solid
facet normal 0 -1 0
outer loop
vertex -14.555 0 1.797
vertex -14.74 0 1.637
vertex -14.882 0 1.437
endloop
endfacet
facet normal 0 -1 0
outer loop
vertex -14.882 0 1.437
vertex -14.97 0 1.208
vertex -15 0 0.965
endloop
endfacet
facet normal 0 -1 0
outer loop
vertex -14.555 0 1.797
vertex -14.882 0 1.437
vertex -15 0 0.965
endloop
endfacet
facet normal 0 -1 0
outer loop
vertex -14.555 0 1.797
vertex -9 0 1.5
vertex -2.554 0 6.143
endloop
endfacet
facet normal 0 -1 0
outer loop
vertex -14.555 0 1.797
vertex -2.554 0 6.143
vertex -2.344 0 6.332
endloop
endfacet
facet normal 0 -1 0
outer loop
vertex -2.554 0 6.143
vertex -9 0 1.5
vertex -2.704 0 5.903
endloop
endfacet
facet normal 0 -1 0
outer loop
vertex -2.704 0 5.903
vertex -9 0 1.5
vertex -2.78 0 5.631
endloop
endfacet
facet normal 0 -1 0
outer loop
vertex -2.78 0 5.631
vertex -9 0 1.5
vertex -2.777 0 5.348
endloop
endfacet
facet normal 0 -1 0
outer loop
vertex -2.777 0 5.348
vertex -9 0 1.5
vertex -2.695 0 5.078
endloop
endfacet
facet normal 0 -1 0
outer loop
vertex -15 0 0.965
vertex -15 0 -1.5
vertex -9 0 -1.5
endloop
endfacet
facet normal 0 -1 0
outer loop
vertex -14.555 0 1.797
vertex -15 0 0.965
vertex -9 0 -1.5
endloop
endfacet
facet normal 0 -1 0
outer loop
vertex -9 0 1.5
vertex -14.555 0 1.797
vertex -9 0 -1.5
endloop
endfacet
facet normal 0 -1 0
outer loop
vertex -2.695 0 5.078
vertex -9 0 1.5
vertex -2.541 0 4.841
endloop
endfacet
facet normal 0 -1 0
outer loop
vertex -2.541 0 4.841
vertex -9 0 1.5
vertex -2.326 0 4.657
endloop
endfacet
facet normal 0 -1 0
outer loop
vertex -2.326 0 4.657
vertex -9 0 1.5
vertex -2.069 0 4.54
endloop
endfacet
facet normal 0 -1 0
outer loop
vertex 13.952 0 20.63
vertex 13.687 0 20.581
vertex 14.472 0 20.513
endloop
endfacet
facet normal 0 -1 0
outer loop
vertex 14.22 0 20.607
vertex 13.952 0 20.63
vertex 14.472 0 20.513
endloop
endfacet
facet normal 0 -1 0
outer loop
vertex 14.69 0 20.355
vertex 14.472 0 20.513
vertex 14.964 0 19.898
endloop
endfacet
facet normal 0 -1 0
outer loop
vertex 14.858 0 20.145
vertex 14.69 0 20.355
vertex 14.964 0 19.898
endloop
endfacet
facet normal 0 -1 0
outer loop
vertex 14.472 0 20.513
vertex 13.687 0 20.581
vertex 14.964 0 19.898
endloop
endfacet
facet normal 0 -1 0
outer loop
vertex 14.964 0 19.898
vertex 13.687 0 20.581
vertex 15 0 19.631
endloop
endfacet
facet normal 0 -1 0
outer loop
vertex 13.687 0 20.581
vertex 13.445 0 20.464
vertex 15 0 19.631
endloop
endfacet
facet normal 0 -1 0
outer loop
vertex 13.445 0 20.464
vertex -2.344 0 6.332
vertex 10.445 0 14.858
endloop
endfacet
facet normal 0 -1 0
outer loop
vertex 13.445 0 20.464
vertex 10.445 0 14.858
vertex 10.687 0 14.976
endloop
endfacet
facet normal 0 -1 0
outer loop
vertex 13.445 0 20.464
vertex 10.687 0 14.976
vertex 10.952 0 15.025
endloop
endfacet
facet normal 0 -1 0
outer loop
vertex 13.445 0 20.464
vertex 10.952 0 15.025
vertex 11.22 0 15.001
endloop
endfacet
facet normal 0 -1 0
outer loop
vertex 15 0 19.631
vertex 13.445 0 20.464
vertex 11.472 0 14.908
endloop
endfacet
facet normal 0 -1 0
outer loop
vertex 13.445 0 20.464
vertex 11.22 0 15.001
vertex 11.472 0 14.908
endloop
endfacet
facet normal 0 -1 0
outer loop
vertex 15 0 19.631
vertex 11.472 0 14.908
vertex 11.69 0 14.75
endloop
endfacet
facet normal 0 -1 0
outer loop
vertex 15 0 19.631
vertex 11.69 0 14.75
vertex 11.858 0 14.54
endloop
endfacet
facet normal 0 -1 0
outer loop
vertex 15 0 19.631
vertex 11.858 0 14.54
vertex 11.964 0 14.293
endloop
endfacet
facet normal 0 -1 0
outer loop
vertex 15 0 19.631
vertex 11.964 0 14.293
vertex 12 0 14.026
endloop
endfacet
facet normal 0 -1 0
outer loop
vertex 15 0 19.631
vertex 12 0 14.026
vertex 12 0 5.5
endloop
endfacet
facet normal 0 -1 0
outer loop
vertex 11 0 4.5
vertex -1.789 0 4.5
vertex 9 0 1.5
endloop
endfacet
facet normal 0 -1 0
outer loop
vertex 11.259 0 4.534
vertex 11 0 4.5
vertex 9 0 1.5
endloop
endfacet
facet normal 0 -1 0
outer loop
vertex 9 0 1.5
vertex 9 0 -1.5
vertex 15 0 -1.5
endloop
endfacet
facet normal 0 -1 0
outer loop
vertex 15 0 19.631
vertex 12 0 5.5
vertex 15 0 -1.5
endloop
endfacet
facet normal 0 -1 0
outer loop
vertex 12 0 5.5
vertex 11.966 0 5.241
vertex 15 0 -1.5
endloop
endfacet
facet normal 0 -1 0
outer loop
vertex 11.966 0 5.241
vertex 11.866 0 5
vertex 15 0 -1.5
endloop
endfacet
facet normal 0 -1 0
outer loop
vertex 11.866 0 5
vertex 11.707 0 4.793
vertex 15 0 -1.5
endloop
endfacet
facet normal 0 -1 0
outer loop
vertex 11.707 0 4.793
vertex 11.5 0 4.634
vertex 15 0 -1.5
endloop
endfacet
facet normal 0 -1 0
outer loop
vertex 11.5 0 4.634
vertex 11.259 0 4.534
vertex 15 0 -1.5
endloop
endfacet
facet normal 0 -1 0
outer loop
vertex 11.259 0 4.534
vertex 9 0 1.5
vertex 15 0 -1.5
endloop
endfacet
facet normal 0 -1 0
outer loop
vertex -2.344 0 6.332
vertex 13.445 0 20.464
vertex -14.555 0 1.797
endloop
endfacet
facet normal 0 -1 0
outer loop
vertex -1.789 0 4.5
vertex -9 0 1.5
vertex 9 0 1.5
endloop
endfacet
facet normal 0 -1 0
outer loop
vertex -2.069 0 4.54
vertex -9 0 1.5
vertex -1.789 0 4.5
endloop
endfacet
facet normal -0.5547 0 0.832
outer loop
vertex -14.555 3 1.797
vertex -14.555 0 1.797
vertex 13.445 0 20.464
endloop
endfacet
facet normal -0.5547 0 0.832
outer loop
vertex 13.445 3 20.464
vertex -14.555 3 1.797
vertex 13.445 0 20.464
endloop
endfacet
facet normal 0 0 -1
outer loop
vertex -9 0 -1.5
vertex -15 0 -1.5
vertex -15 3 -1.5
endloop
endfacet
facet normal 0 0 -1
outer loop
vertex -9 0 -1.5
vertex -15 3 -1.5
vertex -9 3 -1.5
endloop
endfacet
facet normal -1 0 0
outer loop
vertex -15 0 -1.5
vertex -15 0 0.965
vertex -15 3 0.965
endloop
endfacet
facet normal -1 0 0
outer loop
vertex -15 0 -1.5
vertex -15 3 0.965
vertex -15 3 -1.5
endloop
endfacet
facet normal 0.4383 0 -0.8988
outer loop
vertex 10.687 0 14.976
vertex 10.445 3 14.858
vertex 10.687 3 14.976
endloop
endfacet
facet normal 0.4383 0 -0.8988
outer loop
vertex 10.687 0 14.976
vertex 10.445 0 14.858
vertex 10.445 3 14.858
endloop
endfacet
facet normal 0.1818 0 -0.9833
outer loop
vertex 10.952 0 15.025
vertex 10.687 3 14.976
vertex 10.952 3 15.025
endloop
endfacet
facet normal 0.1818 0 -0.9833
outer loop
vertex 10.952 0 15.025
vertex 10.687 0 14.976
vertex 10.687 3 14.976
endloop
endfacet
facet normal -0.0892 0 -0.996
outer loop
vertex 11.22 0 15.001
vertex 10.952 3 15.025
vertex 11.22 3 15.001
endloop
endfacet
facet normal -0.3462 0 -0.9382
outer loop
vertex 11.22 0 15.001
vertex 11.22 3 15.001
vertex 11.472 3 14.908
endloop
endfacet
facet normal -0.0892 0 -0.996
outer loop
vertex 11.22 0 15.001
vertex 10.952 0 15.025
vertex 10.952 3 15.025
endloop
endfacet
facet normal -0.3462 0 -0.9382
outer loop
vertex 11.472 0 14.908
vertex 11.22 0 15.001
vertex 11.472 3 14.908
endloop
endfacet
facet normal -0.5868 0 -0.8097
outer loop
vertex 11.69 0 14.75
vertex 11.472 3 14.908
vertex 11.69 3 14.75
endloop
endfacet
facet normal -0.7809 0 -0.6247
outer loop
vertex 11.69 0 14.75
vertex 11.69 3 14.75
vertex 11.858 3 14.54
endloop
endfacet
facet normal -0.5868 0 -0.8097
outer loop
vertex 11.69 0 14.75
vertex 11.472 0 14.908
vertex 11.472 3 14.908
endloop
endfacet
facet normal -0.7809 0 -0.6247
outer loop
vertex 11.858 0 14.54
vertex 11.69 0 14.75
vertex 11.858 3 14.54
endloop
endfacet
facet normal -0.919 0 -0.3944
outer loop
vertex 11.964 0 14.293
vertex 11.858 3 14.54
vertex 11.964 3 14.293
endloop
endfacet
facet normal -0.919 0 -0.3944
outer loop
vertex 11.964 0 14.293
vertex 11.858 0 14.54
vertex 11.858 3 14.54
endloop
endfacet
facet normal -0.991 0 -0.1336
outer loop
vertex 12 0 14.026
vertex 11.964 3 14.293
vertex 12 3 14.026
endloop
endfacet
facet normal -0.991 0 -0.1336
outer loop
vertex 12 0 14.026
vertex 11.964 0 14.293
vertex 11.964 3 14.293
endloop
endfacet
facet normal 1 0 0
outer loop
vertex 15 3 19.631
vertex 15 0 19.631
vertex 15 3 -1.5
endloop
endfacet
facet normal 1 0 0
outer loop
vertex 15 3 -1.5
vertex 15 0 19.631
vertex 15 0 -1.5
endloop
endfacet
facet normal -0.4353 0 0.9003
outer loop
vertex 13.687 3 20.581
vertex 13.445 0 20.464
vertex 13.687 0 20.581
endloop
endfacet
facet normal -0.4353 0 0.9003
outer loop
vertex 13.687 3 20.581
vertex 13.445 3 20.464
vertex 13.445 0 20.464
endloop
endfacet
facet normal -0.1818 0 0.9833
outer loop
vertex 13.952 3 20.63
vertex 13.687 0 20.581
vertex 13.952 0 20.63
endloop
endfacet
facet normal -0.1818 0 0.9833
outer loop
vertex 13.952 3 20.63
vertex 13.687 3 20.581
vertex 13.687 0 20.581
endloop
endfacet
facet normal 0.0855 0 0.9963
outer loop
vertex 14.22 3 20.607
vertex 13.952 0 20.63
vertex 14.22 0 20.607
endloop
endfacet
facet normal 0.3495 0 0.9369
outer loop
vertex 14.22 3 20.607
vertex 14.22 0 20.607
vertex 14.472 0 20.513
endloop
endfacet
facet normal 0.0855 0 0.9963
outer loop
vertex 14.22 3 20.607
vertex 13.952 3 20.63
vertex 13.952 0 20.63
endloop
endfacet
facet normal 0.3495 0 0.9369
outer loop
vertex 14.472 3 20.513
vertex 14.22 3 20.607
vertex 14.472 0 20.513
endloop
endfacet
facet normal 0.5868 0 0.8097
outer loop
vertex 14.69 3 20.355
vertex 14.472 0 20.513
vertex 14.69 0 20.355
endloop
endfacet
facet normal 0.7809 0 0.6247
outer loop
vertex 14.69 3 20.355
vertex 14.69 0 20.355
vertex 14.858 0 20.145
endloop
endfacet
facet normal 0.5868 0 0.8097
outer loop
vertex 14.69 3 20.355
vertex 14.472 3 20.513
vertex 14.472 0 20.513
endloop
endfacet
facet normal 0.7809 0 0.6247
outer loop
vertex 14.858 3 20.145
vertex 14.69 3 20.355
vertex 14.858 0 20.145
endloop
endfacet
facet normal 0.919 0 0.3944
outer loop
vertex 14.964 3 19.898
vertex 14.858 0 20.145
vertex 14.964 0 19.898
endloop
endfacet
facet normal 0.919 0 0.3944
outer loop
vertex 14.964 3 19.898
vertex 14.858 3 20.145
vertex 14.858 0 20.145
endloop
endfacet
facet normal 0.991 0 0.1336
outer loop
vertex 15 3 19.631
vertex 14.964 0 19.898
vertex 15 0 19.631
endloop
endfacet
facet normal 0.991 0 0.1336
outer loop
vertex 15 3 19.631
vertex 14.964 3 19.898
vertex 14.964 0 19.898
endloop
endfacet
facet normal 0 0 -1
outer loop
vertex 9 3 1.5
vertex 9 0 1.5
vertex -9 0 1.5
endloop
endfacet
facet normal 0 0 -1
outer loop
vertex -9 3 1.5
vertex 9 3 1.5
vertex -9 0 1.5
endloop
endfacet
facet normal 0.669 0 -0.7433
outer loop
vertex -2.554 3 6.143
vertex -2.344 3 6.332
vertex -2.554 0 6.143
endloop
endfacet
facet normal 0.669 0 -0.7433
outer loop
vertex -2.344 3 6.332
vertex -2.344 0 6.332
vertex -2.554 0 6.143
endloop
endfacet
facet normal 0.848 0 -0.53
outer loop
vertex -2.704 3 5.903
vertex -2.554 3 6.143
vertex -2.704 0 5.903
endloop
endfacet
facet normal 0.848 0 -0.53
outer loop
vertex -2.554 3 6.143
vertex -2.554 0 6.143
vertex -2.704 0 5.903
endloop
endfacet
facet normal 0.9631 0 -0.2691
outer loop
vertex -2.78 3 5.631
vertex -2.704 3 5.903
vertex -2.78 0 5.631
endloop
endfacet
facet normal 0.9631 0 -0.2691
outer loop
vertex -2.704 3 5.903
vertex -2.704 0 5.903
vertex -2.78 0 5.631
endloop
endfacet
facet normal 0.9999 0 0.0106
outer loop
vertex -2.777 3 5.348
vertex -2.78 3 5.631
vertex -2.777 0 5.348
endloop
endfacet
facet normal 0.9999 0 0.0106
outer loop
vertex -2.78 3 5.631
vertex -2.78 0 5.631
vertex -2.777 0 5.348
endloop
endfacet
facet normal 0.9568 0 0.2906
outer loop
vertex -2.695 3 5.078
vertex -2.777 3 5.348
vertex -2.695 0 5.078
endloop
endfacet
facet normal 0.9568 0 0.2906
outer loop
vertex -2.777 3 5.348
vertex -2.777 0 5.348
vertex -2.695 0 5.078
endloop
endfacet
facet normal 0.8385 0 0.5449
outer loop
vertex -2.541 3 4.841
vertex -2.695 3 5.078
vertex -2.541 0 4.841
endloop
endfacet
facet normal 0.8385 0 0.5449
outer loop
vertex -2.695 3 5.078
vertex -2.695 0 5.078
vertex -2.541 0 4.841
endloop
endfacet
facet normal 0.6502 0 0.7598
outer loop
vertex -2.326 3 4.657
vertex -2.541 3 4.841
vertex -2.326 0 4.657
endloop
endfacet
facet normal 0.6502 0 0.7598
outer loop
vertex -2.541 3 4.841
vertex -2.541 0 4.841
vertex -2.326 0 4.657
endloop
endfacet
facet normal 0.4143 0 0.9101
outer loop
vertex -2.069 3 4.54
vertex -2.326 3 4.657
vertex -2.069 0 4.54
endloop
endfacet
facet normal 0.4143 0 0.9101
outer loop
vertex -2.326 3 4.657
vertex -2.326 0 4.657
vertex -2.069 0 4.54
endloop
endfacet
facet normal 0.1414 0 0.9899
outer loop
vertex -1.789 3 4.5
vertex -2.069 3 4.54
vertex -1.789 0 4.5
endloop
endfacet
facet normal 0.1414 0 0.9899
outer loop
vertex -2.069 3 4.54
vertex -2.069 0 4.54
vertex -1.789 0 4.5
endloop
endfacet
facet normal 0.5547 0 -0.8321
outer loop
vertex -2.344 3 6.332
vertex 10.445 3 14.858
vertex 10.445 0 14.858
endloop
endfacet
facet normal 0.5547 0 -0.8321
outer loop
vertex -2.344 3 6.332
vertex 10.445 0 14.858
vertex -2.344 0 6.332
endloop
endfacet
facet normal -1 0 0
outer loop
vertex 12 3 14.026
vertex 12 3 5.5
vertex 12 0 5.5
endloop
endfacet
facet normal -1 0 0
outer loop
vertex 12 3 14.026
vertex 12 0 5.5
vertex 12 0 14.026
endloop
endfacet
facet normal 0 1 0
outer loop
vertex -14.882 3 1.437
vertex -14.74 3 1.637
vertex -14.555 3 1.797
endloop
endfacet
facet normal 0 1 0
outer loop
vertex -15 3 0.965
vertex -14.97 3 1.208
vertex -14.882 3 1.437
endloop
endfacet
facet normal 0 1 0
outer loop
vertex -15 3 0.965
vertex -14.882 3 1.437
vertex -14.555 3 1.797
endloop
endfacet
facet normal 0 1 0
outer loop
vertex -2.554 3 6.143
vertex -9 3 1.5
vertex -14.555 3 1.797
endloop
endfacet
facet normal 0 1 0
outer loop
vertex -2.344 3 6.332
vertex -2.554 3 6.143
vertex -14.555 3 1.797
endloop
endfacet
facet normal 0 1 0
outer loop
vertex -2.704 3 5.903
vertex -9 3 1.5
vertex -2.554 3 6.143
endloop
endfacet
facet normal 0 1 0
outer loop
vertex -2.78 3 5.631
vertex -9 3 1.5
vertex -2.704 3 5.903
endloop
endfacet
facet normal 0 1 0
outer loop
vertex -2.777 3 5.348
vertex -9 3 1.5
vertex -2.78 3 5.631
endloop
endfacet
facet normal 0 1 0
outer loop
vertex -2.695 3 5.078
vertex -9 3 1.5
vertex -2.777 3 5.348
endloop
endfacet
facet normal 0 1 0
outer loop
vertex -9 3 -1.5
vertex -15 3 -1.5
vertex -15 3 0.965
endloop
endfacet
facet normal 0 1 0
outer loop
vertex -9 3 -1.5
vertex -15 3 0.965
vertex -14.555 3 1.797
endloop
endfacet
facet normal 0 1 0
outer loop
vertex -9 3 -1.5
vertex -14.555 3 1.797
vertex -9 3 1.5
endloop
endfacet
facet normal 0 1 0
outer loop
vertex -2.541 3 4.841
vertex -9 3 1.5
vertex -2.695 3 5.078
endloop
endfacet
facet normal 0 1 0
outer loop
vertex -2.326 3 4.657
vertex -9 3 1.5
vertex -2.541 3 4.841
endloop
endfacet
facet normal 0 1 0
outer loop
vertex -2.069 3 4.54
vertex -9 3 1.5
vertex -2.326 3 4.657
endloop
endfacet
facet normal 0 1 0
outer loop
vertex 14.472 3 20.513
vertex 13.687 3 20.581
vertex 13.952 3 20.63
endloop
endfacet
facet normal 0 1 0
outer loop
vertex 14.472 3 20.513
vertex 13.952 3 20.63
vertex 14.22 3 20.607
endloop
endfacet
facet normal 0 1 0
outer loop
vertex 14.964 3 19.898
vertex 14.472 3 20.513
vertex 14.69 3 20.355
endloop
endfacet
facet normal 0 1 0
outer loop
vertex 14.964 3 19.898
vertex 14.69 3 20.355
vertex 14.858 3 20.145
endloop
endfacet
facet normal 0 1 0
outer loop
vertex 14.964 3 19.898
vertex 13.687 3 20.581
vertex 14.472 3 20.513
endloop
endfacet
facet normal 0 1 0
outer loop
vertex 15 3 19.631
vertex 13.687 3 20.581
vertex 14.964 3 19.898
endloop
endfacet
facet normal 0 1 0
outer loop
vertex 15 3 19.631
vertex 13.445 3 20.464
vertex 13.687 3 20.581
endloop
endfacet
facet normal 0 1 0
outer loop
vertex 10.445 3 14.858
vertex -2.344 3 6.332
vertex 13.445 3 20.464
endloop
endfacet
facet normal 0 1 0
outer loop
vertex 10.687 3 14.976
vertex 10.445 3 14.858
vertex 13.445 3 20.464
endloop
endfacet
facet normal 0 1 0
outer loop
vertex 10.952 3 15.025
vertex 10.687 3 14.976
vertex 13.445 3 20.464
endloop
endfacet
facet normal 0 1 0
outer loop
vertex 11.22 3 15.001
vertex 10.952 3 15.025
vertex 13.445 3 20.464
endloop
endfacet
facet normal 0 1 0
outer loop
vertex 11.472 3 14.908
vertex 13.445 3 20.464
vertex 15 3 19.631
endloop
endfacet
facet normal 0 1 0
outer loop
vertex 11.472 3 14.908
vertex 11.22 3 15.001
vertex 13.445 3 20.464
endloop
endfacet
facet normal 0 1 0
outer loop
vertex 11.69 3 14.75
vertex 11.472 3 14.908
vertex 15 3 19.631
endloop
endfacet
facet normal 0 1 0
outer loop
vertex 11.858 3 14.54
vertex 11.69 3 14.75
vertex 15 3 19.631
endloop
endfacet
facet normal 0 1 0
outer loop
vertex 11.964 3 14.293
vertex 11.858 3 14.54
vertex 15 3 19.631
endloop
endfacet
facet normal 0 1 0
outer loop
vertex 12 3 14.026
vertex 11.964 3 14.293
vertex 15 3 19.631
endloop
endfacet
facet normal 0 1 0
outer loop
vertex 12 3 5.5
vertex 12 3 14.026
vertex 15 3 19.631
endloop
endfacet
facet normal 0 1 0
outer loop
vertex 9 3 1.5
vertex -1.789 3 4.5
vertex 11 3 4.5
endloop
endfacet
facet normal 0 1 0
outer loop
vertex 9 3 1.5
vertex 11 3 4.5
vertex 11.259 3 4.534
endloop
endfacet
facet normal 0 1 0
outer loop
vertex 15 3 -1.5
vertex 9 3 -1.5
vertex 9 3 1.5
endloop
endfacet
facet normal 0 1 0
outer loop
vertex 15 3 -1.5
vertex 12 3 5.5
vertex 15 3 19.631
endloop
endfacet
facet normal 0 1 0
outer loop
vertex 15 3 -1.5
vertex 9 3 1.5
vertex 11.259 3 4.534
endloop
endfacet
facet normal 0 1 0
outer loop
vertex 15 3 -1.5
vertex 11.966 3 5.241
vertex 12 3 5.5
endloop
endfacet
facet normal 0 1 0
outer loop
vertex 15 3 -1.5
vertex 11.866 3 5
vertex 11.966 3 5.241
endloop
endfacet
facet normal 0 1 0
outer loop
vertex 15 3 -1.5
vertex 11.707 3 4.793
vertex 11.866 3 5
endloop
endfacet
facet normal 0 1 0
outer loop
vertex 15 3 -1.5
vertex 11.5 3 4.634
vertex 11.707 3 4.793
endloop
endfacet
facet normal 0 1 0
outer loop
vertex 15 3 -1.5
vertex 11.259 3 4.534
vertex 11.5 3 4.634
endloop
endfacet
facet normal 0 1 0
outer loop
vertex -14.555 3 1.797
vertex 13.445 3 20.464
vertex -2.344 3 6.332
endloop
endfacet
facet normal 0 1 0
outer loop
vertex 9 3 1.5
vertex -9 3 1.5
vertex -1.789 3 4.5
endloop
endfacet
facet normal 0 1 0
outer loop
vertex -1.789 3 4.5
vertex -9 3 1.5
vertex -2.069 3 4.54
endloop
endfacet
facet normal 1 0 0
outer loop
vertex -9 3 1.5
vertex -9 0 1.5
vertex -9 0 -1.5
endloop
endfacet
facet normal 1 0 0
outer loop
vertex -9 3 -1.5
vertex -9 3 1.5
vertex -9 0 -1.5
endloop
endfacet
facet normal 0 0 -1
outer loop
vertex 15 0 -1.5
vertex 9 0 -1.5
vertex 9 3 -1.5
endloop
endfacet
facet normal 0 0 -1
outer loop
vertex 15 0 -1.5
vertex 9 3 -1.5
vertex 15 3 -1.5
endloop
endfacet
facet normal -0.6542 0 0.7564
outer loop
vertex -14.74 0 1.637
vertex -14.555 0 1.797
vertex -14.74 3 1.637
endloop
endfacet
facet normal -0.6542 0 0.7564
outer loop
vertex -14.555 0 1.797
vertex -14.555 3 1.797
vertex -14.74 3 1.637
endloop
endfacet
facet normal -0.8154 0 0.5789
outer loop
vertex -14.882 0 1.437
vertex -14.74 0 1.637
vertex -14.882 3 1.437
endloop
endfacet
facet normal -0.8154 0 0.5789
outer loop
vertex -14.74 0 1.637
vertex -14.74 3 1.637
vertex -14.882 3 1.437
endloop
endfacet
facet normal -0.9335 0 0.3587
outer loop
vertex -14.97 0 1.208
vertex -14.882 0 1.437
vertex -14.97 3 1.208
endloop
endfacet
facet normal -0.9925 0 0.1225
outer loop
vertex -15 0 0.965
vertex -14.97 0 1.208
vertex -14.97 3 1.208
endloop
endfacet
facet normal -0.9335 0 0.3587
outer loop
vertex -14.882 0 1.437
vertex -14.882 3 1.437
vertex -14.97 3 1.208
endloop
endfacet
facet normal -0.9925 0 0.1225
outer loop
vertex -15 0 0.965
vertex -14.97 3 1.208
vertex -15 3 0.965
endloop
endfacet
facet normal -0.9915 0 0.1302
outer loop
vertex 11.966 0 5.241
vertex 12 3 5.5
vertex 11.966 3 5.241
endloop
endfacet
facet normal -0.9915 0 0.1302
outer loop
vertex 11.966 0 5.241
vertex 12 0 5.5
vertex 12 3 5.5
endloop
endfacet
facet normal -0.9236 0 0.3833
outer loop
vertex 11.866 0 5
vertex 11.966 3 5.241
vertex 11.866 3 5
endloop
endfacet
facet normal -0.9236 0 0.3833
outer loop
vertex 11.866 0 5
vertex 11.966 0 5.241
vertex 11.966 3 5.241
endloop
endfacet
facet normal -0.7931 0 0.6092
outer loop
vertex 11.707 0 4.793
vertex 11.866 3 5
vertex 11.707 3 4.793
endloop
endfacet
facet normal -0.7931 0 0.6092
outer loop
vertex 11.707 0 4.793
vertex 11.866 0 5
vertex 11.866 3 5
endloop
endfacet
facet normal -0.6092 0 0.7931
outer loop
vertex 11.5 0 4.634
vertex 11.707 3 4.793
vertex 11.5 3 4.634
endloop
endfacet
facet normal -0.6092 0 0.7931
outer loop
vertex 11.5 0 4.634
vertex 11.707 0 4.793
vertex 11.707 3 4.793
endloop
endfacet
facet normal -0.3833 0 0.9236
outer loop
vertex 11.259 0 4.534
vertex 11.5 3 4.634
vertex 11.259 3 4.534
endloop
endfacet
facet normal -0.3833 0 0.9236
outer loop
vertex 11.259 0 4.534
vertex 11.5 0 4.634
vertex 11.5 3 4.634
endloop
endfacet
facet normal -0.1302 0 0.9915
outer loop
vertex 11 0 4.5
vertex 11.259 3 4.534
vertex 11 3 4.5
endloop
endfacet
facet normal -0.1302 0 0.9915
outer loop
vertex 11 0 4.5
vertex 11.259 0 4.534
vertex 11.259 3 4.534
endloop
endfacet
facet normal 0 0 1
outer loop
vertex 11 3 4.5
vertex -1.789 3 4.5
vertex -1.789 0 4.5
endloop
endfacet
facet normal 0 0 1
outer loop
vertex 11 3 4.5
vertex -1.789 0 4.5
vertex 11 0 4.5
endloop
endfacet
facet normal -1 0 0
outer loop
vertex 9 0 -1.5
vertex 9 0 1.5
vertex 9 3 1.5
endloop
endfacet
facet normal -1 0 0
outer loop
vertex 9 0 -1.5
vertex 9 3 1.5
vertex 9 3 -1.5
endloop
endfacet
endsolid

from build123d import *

# Parameters (mm, degrees)
SKETCH1_W           = 6
SKETCH1_H           = 3
BOSS_EXTRUDE1_DEPTH = 3
CUT_EXTRUDE1_REACH  = 28.387
FILLET1_R           = 1


with BuildPart() as part:
    # Sketch1 → Boss-Extrude1 (new body)
    with BuildSketch(Plane(origin=(0, 0, 0), x_dir=(1, 0, 0), z_dir=(0, 1, 0))):
        Polygon((-15, -1.5), (15, -21.5), (15, -1.5), align=None)
        with Locations((-12, 0)):
            Rectangle(SKETCH1_W, SKETCH1_H)
        with Locations((12, 0)):
            Rectangle(SKETCH1_W, SKETCH1_H)
    extrude(amount=BOSS_EXTRUDE1_DEPTH)

    # Sketch2 → Cut-Extrude1 (cut, up to next)
    with BuildSketch(Plane(origin=(0, 3, 0), x_dir=(1, 0, 0), z_dir=(0, 1, 0)), mode=Mode.PRIVATE) as cut_extrude1_sk1:
        Polygon((12, -15.894448725), (-5.091673087, -4.5), (12, -4.5), align=None)
    cut_extrude1_tool1 = extrude(cut_extrude1_sk1.sketch, amount=-CUT_EXTRUDE1_REACH, mode=Mode.PRIVATE) & part.part
    add(cut_extrude1_tool1.solids().sort_by_distance((6.302776, 3, 8.29815))[0], mode=Mode.SUBTRACT)

    # Fillet1
    fillet1_edges = [part.edges().sort_by_distance(p)[0] for p in [
        (-15, 1.5, 1.5),
        (15, 1.5, 21.5),
        (12, 1.5, 15.894448725),
        (-5.091673087, 1.5, 4.5),
        (12, 1.5, 4.5),
    ]]
    fillet(fillet1_edges, radius=FILLET1_R)


solid = part.part
